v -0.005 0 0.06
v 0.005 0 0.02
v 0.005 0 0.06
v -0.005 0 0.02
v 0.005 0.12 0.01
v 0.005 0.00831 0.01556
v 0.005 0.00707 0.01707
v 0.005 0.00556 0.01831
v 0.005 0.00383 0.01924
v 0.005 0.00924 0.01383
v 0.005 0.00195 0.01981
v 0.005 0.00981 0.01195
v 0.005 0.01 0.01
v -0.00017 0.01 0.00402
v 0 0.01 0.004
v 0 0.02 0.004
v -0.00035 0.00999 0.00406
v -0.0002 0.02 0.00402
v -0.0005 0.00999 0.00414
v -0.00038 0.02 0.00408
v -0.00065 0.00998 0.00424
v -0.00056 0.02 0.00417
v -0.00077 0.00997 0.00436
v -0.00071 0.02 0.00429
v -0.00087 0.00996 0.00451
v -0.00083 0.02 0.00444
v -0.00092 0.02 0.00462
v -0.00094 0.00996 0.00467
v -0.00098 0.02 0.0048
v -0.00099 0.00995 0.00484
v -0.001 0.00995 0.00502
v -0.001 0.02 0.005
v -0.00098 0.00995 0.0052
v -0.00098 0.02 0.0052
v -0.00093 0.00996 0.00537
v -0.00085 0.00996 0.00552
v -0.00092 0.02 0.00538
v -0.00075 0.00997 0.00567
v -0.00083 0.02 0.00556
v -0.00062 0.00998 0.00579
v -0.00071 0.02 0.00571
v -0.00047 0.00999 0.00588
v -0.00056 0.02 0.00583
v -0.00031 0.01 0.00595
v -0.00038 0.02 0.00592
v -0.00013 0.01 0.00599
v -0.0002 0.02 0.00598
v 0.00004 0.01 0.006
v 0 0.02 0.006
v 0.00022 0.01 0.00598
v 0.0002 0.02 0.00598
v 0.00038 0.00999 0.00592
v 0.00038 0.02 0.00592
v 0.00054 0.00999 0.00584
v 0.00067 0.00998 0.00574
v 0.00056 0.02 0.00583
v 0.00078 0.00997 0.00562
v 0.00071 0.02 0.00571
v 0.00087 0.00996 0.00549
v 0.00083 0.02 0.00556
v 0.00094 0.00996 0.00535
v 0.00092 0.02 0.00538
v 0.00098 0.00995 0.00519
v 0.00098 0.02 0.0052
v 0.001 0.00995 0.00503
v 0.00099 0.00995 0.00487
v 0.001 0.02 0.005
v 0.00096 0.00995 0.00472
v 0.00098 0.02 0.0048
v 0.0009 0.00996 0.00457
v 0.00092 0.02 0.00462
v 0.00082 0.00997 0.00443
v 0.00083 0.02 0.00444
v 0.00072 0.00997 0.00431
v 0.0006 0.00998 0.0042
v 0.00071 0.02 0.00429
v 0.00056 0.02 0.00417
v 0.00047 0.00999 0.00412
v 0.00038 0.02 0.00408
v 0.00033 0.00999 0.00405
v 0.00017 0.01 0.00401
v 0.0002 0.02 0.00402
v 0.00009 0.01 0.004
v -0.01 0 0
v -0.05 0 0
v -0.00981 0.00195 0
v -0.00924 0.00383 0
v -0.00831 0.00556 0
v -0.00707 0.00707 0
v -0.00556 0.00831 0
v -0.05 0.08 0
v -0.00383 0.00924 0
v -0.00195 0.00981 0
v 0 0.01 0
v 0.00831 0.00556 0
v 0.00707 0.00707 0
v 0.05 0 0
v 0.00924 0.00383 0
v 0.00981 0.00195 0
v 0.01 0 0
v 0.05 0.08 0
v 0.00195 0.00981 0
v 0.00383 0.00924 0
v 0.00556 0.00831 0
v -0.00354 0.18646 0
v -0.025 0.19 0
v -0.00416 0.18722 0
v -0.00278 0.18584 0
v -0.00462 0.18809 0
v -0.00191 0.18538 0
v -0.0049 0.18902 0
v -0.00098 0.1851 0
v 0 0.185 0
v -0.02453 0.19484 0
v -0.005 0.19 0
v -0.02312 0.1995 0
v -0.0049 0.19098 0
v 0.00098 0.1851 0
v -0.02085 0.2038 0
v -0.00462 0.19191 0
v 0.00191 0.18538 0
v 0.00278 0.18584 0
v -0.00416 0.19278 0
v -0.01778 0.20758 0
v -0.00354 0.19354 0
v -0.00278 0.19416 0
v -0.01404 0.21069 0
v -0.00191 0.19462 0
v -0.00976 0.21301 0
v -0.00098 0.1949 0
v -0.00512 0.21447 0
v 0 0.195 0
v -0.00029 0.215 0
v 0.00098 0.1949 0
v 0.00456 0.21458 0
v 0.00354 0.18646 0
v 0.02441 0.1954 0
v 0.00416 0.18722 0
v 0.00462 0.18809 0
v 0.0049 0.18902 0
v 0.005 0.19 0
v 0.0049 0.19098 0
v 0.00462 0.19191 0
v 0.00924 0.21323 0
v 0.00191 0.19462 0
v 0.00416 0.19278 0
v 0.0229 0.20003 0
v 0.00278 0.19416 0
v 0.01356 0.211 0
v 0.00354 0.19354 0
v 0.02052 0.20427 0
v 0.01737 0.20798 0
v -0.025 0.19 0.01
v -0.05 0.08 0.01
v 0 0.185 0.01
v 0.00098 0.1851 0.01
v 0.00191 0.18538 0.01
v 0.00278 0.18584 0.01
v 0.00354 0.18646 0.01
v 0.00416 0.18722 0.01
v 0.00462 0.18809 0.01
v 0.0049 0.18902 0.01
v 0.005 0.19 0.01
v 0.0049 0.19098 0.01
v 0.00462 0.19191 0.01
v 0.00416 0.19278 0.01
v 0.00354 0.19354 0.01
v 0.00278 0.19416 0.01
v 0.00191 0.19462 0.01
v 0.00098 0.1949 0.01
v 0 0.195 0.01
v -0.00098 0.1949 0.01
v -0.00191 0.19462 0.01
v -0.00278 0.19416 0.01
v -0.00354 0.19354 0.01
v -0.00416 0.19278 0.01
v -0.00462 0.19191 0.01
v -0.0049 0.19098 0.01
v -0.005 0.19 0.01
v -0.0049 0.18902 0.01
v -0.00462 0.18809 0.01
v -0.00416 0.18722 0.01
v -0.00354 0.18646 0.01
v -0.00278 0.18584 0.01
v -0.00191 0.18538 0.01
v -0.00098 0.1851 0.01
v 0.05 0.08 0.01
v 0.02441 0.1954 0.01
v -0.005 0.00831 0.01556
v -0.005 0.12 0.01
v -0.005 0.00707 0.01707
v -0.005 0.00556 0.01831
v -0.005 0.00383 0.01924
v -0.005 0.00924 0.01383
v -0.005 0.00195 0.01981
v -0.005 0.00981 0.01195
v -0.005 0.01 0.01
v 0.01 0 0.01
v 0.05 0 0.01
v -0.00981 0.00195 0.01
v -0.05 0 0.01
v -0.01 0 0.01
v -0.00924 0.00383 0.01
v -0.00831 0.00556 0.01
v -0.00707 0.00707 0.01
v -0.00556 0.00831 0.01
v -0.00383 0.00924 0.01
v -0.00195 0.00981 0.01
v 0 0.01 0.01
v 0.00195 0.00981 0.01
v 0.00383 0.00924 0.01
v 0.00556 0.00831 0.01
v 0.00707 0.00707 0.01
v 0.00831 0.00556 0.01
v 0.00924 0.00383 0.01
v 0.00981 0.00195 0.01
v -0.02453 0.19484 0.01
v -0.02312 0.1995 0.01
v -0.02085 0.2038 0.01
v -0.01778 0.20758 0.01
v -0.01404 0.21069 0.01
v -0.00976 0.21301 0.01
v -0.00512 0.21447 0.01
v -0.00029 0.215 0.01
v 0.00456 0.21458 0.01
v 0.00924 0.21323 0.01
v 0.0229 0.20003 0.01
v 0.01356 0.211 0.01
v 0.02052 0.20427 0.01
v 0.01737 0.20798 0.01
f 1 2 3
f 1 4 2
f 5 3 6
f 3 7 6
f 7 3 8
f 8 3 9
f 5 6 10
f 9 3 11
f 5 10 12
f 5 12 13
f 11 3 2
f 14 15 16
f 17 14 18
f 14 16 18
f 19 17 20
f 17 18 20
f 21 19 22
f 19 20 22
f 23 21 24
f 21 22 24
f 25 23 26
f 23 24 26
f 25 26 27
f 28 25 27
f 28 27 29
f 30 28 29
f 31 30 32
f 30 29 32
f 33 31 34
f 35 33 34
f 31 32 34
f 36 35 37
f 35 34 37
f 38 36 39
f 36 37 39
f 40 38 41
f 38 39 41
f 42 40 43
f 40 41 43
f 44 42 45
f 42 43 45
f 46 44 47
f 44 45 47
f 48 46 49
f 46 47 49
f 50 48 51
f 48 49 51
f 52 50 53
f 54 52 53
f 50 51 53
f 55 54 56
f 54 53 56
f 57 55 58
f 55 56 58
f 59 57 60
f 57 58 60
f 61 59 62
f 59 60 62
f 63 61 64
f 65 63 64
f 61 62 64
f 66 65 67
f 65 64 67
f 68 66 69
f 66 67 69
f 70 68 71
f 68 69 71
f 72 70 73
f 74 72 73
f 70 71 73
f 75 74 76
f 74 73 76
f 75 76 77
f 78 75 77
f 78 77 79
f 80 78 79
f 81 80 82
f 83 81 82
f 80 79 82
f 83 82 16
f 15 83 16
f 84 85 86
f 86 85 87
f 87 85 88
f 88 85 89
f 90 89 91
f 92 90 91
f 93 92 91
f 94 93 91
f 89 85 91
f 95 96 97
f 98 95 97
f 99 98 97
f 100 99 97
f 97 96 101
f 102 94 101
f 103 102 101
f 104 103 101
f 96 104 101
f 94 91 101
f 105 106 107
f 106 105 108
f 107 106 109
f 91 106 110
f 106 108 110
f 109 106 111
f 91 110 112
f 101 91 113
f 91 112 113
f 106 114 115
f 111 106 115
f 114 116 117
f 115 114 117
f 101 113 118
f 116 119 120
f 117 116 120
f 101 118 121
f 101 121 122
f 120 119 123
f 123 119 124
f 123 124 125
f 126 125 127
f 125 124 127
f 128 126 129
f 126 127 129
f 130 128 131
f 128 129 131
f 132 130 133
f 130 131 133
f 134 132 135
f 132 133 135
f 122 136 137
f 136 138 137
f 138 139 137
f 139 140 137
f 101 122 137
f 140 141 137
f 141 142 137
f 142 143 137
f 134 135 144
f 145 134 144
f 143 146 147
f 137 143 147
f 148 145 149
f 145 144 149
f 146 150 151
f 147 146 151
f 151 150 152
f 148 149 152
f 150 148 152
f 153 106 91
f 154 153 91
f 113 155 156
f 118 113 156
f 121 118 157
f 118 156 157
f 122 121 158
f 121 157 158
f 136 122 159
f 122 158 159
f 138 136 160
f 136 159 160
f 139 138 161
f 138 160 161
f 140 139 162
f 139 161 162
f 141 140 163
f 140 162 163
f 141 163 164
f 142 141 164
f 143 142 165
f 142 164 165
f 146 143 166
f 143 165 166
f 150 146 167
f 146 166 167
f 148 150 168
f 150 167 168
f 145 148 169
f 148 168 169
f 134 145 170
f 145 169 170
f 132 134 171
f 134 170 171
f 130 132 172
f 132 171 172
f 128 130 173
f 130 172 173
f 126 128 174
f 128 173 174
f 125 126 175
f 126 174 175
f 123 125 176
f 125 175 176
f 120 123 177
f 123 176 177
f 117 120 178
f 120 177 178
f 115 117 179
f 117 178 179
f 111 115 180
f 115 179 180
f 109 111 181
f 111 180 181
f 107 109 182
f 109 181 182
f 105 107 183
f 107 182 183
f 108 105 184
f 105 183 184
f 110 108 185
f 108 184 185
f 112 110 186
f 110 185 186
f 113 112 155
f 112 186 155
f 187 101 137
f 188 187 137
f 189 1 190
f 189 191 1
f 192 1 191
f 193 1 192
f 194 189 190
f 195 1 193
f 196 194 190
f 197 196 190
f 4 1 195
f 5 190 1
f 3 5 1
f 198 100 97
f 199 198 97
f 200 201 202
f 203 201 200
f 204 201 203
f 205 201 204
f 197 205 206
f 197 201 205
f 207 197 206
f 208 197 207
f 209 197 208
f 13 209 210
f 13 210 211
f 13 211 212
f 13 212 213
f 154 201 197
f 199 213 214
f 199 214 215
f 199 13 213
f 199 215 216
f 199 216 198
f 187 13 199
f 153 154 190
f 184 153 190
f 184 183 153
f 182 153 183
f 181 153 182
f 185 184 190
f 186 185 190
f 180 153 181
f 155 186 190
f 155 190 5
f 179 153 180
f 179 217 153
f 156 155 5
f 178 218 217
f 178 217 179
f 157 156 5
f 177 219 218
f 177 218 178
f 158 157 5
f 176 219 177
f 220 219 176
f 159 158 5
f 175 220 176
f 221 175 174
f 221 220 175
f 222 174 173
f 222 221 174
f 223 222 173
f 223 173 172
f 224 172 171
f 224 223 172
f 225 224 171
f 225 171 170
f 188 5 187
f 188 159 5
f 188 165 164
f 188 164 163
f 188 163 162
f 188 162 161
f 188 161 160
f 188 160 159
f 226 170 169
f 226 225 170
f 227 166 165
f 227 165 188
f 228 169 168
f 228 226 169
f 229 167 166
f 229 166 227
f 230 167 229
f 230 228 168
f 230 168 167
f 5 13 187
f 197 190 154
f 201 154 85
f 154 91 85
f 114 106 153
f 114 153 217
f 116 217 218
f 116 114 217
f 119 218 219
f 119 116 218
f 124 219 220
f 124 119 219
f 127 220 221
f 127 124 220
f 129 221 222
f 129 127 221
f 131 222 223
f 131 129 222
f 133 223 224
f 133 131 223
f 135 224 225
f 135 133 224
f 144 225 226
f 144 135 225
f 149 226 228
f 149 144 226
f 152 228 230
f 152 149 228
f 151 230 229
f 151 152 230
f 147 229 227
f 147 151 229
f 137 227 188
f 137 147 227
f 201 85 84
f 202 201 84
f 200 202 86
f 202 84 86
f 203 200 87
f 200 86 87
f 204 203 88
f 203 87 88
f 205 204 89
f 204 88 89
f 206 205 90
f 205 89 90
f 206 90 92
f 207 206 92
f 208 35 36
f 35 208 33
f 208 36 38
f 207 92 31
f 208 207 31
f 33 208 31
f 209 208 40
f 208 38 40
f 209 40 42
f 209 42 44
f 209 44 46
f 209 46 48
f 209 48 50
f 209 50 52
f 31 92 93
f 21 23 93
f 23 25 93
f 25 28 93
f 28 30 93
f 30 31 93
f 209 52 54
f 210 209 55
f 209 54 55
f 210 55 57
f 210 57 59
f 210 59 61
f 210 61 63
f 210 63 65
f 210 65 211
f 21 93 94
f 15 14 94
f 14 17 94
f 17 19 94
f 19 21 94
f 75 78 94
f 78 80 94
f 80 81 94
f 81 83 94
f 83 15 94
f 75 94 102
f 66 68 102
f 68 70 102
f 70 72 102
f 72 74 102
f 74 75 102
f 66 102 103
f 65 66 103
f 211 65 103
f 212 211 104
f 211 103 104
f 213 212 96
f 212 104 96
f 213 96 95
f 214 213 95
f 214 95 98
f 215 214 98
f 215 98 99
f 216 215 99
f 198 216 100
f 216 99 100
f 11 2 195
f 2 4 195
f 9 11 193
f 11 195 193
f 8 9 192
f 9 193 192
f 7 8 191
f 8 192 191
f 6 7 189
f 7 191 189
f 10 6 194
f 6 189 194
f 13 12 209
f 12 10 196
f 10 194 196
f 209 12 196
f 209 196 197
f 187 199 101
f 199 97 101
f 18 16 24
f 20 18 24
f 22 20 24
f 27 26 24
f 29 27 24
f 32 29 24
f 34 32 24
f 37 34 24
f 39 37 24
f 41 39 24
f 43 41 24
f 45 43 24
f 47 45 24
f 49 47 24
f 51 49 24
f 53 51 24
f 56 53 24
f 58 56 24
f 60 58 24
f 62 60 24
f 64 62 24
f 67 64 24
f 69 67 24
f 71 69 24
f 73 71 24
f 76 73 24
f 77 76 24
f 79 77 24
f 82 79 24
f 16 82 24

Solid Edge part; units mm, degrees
sketch "Sketch1" plane through (0, 0, 0) normal (0, 0, 1) x (1, 0, 0)
  line L0 (-0.05, 0) -> (0.05, 0)
  line L1 (0.05, 0) -> (0.05, 0.08)
  line L2 (0.05, 0.08) -> (0.0244, 0.1954)
  line L3 (-0.025, 0.19) -> (-0.05, 0.08)
  line L4 (-0.05, 0.08) -> (-0.05, 0)
  arc A0 (0.0244, 0.1954) -> (-0.025, 0.19) centre (0, 0.19) ccw
  dimension "D1" = 0.05
  dimension "D2" = 0.05
extrude "Protrusion1" add sketch "Sketch1" along normal blind 0.01
hole "Bohrung_1" at (0, 0, 0.005) direction (0, 1, 0) diameter 0.002 depth 0.02
hole "Bohrung_2" at (0, 0.19, 0.01) direction (0, 0, -1) diameter 0.01 end through all
hole "Bohrung_3" at (0, 0, 0.01) direction (0, 0, -1) diameter 0.02 depth 3.175
sketch "Sketch2" plane through (0, 0, 0) normal (1, 0, 0) x (0, 1, 0)
  line L0 (0.12, 0.01) -> (0.01, 0.01)
  line L1 (0, 0.02) -> (0, 0.06)
  line L2 (0.12, 0.01) -> (0, 0.06)
  arc A0 (0.01, 0.01) -> (0, 0.02) centre (0, 0.01) ccw
extrude "Ausprägung_2" add sketch "Sketch2" along normal mid plane 0.01
